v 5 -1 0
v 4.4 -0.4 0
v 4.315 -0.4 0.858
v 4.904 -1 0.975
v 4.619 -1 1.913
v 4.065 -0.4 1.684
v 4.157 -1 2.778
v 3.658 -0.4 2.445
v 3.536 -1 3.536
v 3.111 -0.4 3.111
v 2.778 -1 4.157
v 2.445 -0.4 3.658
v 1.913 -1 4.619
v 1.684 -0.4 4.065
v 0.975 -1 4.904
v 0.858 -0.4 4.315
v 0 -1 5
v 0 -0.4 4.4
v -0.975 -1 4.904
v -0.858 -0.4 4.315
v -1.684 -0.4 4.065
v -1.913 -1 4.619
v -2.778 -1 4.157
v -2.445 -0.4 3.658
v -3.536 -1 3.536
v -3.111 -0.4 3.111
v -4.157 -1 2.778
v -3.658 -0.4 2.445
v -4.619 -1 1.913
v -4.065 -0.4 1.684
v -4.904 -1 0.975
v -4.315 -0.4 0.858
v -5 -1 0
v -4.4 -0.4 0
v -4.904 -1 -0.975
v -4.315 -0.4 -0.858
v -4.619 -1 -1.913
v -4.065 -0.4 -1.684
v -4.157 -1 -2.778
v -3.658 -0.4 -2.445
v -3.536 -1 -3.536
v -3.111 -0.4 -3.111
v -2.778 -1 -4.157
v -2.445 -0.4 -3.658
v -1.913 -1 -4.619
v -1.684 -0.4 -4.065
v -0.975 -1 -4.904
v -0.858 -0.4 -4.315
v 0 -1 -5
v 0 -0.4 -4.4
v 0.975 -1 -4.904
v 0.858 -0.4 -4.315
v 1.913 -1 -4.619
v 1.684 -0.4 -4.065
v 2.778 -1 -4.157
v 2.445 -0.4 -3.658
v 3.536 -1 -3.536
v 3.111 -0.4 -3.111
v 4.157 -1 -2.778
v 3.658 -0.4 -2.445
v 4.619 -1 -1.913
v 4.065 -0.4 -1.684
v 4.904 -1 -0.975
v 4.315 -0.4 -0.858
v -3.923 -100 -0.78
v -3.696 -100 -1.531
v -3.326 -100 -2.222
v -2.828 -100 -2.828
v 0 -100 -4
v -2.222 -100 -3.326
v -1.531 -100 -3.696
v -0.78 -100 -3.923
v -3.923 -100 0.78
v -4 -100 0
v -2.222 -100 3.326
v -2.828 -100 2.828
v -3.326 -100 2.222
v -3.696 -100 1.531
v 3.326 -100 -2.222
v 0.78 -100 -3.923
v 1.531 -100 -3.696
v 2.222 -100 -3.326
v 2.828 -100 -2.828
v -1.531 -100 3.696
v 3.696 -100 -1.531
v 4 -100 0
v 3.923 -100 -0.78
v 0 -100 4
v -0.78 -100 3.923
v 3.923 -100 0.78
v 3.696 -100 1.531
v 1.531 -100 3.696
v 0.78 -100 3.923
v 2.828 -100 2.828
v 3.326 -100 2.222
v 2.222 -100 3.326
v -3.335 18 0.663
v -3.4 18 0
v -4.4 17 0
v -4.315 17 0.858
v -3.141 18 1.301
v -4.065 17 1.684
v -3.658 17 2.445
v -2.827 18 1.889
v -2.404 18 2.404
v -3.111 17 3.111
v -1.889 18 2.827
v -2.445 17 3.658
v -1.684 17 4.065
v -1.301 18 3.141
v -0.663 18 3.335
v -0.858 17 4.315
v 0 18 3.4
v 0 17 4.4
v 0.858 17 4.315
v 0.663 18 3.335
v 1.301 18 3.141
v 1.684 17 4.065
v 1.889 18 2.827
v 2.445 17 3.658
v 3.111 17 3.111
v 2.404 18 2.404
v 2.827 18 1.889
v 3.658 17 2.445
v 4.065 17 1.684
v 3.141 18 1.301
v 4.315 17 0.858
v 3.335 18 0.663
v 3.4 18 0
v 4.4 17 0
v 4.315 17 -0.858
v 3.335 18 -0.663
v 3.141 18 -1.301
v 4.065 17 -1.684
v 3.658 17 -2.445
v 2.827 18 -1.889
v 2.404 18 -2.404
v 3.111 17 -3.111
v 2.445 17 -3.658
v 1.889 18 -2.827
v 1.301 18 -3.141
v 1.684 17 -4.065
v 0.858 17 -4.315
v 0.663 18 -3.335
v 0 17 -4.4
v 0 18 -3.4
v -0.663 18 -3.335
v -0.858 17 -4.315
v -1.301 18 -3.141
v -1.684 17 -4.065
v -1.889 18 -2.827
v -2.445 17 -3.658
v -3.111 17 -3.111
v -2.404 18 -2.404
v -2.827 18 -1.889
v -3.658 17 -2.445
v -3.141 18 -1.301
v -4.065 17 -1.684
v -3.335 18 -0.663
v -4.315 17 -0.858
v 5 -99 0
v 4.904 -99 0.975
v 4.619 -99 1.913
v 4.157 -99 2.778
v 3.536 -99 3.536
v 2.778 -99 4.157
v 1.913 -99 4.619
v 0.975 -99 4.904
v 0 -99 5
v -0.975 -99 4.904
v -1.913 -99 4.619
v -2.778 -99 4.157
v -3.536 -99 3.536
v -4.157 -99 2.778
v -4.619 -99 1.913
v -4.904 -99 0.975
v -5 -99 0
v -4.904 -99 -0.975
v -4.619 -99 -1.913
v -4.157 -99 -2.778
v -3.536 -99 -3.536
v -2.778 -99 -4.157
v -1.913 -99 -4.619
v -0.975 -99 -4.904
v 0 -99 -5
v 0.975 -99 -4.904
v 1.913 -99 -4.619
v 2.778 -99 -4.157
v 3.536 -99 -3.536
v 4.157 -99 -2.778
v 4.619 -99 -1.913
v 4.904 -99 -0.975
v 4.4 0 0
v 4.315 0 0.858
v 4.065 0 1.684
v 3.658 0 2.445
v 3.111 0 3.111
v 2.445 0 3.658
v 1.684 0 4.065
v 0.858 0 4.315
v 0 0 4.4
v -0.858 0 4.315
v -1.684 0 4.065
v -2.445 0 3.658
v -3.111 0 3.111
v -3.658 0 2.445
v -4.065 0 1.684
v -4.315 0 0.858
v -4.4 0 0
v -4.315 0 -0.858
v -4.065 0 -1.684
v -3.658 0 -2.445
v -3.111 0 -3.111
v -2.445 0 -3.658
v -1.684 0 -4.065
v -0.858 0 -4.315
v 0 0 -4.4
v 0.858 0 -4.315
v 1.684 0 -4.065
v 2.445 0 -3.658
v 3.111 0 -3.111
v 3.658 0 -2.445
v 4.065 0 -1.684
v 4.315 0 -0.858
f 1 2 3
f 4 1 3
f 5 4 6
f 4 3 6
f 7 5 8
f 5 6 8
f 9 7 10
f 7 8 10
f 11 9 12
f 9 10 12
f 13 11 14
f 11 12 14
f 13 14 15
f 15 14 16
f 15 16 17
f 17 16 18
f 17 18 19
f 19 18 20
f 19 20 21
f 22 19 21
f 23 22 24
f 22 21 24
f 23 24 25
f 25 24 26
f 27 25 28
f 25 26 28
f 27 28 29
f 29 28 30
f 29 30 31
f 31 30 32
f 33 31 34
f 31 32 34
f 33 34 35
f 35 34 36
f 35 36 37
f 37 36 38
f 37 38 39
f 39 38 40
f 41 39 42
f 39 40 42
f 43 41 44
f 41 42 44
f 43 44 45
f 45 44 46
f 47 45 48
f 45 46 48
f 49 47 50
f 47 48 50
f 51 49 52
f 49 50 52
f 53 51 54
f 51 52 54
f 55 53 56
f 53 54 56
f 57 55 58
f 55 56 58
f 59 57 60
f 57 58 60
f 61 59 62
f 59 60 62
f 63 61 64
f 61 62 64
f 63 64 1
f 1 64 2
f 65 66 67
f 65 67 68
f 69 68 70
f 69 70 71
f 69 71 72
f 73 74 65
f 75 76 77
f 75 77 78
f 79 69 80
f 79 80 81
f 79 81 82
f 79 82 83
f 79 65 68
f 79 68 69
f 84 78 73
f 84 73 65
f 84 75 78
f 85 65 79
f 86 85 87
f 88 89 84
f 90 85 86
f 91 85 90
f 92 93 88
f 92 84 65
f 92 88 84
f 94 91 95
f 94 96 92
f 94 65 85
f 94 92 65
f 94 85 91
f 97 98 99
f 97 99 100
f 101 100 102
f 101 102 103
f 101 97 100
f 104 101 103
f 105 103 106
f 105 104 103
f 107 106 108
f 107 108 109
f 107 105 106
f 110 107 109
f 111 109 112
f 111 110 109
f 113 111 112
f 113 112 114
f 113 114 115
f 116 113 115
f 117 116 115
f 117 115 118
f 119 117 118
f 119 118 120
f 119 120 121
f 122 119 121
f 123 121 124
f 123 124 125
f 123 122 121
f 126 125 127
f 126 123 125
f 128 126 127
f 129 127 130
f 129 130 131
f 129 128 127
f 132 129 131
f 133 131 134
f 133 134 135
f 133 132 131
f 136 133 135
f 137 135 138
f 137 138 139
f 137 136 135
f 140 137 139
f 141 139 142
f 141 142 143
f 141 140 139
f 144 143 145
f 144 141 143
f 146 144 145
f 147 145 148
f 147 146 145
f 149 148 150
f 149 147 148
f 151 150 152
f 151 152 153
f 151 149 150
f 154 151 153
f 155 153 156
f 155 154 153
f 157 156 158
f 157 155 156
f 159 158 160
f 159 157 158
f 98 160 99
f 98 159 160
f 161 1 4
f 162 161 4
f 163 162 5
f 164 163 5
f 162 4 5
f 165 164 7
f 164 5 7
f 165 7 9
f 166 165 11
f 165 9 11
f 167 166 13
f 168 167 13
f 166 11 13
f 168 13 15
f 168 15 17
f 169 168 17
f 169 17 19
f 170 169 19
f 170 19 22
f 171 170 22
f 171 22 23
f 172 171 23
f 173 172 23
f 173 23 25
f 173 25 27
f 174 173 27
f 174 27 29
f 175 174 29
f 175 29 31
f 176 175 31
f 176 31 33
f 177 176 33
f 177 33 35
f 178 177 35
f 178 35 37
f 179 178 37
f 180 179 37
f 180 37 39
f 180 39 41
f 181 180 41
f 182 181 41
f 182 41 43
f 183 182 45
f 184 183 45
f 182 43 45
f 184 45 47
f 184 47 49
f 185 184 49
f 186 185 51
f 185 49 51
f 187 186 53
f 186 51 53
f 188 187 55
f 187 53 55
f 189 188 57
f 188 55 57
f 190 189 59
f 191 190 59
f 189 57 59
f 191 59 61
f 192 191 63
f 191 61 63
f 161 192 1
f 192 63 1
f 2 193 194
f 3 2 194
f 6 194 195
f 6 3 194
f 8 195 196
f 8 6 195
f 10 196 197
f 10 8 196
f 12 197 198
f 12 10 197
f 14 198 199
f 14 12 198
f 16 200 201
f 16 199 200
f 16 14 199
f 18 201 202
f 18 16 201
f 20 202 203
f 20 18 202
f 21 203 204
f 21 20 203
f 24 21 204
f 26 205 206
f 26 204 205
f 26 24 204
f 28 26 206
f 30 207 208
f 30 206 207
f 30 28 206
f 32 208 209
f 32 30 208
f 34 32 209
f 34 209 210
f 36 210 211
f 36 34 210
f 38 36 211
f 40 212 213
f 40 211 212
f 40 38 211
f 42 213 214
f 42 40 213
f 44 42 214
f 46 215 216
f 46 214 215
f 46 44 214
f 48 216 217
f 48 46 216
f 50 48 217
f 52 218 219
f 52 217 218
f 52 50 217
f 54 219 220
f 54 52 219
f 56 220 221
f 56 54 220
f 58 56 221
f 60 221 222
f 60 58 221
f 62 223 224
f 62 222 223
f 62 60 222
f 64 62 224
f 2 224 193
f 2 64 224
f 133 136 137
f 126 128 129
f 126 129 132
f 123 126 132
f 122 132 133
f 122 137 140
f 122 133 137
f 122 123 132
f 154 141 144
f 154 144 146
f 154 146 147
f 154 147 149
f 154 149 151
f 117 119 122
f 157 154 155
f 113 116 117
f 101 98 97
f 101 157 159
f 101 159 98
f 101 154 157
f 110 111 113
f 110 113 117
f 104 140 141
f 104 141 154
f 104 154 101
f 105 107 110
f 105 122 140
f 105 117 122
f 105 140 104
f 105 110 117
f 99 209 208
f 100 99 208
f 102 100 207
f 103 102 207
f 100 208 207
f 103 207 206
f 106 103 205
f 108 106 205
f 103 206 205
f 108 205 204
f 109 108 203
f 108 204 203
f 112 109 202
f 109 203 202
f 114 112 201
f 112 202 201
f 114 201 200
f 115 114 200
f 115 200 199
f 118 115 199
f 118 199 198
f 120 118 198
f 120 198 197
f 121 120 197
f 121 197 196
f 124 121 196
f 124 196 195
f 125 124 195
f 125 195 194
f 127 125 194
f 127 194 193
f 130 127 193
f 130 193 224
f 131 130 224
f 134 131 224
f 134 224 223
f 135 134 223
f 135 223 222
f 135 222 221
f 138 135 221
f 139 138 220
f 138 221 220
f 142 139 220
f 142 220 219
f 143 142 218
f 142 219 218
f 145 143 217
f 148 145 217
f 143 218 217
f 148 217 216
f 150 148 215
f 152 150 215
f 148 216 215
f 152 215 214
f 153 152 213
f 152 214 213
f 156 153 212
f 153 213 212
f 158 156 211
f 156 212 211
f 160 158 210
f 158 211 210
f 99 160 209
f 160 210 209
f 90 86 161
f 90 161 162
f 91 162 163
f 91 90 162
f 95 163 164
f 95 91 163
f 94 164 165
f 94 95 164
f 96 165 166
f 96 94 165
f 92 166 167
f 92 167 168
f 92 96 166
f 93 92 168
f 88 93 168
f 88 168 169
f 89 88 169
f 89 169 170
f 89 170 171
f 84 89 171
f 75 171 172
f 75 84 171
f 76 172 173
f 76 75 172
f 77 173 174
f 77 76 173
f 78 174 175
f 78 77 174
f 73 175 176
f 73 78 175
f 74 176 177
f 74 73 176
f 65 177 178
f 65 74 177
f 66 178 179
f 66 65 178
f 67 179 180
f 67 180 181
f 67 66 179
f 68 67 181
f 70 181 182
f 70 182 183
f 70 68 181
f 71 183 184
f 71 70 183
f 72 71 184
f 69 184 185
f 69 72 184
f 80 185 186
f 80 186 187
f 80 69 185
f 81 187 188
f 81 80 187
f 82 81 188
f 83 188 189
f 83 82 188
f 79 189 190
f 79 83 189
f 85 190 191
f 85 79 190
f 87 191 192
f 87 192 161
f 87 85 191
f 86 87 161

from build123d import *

# Parameters (mm, degrees)
F0_R        = 5
F1_DEPTH    = 100
F2_R        = 4.4
F3_DEPTH    = 18
F4_S5_R     = 4.4
F4_T6_DEPTH = 9
F5_SIZE     = 1


# Not quite as in the source:
# - a fillet or chamfer that OpenCascade refuses, or shapes differently, is made with other operations: its cross-section is extruded or revolved along the edge and cut away or added


with BuildPart() as f1:
    # F0 (on Front) → F1 (new body)
    with BuildSketch(Plane.XZ):
        Circle(F0_R)
    extrude(amount=F1_DEPTH)

    # F2 (on face) → F3 (join)
    with BuildSketch(Plane(origin=(0, 0, 0), x_dir=(-1, 0, 0), z_dir=(0, 1, 0))):
        Circle(F2_R)
    extrude(amount=F3_DEPTH)

    # F4: chamfer of 1 on 1 edges, made by hand


with BuildPart() as f4_tool2:
    # F4_s3 → F4_t4 (revolve)
    with BuildSketch(Plane.XY):
        Polygon((5, -1), (4, 0), (5, 0), align=None)
    revolve(axis=Axis((0, 0, 0), (0, -1, 0)))

    # F4_s5 → F4_t6 (cut, symmetric)
    with BuildSketch(Plane.XZ.offset(0.5)):
        Circle(F4_S5_R)
    extrude(amount=F4_T6_DEPTH, both=True, mode=Mode.SUBTRACT)


with BuildPart() as f1_1:
    add(f1.part)

    # F4_t1: cut F4_tool2
    add(f4_tool2.part, mode=Mode.SUBTRACT)

    # F5
    f5_edges = [f1_1.edges().sort_by_distance(p)[0] for p in [
        (-5, -100, 0),
        (4.4, 18, 0),
    ]]
    chamfer(f5_edges, length=F5_SIZE)


solid = f1_1.part
